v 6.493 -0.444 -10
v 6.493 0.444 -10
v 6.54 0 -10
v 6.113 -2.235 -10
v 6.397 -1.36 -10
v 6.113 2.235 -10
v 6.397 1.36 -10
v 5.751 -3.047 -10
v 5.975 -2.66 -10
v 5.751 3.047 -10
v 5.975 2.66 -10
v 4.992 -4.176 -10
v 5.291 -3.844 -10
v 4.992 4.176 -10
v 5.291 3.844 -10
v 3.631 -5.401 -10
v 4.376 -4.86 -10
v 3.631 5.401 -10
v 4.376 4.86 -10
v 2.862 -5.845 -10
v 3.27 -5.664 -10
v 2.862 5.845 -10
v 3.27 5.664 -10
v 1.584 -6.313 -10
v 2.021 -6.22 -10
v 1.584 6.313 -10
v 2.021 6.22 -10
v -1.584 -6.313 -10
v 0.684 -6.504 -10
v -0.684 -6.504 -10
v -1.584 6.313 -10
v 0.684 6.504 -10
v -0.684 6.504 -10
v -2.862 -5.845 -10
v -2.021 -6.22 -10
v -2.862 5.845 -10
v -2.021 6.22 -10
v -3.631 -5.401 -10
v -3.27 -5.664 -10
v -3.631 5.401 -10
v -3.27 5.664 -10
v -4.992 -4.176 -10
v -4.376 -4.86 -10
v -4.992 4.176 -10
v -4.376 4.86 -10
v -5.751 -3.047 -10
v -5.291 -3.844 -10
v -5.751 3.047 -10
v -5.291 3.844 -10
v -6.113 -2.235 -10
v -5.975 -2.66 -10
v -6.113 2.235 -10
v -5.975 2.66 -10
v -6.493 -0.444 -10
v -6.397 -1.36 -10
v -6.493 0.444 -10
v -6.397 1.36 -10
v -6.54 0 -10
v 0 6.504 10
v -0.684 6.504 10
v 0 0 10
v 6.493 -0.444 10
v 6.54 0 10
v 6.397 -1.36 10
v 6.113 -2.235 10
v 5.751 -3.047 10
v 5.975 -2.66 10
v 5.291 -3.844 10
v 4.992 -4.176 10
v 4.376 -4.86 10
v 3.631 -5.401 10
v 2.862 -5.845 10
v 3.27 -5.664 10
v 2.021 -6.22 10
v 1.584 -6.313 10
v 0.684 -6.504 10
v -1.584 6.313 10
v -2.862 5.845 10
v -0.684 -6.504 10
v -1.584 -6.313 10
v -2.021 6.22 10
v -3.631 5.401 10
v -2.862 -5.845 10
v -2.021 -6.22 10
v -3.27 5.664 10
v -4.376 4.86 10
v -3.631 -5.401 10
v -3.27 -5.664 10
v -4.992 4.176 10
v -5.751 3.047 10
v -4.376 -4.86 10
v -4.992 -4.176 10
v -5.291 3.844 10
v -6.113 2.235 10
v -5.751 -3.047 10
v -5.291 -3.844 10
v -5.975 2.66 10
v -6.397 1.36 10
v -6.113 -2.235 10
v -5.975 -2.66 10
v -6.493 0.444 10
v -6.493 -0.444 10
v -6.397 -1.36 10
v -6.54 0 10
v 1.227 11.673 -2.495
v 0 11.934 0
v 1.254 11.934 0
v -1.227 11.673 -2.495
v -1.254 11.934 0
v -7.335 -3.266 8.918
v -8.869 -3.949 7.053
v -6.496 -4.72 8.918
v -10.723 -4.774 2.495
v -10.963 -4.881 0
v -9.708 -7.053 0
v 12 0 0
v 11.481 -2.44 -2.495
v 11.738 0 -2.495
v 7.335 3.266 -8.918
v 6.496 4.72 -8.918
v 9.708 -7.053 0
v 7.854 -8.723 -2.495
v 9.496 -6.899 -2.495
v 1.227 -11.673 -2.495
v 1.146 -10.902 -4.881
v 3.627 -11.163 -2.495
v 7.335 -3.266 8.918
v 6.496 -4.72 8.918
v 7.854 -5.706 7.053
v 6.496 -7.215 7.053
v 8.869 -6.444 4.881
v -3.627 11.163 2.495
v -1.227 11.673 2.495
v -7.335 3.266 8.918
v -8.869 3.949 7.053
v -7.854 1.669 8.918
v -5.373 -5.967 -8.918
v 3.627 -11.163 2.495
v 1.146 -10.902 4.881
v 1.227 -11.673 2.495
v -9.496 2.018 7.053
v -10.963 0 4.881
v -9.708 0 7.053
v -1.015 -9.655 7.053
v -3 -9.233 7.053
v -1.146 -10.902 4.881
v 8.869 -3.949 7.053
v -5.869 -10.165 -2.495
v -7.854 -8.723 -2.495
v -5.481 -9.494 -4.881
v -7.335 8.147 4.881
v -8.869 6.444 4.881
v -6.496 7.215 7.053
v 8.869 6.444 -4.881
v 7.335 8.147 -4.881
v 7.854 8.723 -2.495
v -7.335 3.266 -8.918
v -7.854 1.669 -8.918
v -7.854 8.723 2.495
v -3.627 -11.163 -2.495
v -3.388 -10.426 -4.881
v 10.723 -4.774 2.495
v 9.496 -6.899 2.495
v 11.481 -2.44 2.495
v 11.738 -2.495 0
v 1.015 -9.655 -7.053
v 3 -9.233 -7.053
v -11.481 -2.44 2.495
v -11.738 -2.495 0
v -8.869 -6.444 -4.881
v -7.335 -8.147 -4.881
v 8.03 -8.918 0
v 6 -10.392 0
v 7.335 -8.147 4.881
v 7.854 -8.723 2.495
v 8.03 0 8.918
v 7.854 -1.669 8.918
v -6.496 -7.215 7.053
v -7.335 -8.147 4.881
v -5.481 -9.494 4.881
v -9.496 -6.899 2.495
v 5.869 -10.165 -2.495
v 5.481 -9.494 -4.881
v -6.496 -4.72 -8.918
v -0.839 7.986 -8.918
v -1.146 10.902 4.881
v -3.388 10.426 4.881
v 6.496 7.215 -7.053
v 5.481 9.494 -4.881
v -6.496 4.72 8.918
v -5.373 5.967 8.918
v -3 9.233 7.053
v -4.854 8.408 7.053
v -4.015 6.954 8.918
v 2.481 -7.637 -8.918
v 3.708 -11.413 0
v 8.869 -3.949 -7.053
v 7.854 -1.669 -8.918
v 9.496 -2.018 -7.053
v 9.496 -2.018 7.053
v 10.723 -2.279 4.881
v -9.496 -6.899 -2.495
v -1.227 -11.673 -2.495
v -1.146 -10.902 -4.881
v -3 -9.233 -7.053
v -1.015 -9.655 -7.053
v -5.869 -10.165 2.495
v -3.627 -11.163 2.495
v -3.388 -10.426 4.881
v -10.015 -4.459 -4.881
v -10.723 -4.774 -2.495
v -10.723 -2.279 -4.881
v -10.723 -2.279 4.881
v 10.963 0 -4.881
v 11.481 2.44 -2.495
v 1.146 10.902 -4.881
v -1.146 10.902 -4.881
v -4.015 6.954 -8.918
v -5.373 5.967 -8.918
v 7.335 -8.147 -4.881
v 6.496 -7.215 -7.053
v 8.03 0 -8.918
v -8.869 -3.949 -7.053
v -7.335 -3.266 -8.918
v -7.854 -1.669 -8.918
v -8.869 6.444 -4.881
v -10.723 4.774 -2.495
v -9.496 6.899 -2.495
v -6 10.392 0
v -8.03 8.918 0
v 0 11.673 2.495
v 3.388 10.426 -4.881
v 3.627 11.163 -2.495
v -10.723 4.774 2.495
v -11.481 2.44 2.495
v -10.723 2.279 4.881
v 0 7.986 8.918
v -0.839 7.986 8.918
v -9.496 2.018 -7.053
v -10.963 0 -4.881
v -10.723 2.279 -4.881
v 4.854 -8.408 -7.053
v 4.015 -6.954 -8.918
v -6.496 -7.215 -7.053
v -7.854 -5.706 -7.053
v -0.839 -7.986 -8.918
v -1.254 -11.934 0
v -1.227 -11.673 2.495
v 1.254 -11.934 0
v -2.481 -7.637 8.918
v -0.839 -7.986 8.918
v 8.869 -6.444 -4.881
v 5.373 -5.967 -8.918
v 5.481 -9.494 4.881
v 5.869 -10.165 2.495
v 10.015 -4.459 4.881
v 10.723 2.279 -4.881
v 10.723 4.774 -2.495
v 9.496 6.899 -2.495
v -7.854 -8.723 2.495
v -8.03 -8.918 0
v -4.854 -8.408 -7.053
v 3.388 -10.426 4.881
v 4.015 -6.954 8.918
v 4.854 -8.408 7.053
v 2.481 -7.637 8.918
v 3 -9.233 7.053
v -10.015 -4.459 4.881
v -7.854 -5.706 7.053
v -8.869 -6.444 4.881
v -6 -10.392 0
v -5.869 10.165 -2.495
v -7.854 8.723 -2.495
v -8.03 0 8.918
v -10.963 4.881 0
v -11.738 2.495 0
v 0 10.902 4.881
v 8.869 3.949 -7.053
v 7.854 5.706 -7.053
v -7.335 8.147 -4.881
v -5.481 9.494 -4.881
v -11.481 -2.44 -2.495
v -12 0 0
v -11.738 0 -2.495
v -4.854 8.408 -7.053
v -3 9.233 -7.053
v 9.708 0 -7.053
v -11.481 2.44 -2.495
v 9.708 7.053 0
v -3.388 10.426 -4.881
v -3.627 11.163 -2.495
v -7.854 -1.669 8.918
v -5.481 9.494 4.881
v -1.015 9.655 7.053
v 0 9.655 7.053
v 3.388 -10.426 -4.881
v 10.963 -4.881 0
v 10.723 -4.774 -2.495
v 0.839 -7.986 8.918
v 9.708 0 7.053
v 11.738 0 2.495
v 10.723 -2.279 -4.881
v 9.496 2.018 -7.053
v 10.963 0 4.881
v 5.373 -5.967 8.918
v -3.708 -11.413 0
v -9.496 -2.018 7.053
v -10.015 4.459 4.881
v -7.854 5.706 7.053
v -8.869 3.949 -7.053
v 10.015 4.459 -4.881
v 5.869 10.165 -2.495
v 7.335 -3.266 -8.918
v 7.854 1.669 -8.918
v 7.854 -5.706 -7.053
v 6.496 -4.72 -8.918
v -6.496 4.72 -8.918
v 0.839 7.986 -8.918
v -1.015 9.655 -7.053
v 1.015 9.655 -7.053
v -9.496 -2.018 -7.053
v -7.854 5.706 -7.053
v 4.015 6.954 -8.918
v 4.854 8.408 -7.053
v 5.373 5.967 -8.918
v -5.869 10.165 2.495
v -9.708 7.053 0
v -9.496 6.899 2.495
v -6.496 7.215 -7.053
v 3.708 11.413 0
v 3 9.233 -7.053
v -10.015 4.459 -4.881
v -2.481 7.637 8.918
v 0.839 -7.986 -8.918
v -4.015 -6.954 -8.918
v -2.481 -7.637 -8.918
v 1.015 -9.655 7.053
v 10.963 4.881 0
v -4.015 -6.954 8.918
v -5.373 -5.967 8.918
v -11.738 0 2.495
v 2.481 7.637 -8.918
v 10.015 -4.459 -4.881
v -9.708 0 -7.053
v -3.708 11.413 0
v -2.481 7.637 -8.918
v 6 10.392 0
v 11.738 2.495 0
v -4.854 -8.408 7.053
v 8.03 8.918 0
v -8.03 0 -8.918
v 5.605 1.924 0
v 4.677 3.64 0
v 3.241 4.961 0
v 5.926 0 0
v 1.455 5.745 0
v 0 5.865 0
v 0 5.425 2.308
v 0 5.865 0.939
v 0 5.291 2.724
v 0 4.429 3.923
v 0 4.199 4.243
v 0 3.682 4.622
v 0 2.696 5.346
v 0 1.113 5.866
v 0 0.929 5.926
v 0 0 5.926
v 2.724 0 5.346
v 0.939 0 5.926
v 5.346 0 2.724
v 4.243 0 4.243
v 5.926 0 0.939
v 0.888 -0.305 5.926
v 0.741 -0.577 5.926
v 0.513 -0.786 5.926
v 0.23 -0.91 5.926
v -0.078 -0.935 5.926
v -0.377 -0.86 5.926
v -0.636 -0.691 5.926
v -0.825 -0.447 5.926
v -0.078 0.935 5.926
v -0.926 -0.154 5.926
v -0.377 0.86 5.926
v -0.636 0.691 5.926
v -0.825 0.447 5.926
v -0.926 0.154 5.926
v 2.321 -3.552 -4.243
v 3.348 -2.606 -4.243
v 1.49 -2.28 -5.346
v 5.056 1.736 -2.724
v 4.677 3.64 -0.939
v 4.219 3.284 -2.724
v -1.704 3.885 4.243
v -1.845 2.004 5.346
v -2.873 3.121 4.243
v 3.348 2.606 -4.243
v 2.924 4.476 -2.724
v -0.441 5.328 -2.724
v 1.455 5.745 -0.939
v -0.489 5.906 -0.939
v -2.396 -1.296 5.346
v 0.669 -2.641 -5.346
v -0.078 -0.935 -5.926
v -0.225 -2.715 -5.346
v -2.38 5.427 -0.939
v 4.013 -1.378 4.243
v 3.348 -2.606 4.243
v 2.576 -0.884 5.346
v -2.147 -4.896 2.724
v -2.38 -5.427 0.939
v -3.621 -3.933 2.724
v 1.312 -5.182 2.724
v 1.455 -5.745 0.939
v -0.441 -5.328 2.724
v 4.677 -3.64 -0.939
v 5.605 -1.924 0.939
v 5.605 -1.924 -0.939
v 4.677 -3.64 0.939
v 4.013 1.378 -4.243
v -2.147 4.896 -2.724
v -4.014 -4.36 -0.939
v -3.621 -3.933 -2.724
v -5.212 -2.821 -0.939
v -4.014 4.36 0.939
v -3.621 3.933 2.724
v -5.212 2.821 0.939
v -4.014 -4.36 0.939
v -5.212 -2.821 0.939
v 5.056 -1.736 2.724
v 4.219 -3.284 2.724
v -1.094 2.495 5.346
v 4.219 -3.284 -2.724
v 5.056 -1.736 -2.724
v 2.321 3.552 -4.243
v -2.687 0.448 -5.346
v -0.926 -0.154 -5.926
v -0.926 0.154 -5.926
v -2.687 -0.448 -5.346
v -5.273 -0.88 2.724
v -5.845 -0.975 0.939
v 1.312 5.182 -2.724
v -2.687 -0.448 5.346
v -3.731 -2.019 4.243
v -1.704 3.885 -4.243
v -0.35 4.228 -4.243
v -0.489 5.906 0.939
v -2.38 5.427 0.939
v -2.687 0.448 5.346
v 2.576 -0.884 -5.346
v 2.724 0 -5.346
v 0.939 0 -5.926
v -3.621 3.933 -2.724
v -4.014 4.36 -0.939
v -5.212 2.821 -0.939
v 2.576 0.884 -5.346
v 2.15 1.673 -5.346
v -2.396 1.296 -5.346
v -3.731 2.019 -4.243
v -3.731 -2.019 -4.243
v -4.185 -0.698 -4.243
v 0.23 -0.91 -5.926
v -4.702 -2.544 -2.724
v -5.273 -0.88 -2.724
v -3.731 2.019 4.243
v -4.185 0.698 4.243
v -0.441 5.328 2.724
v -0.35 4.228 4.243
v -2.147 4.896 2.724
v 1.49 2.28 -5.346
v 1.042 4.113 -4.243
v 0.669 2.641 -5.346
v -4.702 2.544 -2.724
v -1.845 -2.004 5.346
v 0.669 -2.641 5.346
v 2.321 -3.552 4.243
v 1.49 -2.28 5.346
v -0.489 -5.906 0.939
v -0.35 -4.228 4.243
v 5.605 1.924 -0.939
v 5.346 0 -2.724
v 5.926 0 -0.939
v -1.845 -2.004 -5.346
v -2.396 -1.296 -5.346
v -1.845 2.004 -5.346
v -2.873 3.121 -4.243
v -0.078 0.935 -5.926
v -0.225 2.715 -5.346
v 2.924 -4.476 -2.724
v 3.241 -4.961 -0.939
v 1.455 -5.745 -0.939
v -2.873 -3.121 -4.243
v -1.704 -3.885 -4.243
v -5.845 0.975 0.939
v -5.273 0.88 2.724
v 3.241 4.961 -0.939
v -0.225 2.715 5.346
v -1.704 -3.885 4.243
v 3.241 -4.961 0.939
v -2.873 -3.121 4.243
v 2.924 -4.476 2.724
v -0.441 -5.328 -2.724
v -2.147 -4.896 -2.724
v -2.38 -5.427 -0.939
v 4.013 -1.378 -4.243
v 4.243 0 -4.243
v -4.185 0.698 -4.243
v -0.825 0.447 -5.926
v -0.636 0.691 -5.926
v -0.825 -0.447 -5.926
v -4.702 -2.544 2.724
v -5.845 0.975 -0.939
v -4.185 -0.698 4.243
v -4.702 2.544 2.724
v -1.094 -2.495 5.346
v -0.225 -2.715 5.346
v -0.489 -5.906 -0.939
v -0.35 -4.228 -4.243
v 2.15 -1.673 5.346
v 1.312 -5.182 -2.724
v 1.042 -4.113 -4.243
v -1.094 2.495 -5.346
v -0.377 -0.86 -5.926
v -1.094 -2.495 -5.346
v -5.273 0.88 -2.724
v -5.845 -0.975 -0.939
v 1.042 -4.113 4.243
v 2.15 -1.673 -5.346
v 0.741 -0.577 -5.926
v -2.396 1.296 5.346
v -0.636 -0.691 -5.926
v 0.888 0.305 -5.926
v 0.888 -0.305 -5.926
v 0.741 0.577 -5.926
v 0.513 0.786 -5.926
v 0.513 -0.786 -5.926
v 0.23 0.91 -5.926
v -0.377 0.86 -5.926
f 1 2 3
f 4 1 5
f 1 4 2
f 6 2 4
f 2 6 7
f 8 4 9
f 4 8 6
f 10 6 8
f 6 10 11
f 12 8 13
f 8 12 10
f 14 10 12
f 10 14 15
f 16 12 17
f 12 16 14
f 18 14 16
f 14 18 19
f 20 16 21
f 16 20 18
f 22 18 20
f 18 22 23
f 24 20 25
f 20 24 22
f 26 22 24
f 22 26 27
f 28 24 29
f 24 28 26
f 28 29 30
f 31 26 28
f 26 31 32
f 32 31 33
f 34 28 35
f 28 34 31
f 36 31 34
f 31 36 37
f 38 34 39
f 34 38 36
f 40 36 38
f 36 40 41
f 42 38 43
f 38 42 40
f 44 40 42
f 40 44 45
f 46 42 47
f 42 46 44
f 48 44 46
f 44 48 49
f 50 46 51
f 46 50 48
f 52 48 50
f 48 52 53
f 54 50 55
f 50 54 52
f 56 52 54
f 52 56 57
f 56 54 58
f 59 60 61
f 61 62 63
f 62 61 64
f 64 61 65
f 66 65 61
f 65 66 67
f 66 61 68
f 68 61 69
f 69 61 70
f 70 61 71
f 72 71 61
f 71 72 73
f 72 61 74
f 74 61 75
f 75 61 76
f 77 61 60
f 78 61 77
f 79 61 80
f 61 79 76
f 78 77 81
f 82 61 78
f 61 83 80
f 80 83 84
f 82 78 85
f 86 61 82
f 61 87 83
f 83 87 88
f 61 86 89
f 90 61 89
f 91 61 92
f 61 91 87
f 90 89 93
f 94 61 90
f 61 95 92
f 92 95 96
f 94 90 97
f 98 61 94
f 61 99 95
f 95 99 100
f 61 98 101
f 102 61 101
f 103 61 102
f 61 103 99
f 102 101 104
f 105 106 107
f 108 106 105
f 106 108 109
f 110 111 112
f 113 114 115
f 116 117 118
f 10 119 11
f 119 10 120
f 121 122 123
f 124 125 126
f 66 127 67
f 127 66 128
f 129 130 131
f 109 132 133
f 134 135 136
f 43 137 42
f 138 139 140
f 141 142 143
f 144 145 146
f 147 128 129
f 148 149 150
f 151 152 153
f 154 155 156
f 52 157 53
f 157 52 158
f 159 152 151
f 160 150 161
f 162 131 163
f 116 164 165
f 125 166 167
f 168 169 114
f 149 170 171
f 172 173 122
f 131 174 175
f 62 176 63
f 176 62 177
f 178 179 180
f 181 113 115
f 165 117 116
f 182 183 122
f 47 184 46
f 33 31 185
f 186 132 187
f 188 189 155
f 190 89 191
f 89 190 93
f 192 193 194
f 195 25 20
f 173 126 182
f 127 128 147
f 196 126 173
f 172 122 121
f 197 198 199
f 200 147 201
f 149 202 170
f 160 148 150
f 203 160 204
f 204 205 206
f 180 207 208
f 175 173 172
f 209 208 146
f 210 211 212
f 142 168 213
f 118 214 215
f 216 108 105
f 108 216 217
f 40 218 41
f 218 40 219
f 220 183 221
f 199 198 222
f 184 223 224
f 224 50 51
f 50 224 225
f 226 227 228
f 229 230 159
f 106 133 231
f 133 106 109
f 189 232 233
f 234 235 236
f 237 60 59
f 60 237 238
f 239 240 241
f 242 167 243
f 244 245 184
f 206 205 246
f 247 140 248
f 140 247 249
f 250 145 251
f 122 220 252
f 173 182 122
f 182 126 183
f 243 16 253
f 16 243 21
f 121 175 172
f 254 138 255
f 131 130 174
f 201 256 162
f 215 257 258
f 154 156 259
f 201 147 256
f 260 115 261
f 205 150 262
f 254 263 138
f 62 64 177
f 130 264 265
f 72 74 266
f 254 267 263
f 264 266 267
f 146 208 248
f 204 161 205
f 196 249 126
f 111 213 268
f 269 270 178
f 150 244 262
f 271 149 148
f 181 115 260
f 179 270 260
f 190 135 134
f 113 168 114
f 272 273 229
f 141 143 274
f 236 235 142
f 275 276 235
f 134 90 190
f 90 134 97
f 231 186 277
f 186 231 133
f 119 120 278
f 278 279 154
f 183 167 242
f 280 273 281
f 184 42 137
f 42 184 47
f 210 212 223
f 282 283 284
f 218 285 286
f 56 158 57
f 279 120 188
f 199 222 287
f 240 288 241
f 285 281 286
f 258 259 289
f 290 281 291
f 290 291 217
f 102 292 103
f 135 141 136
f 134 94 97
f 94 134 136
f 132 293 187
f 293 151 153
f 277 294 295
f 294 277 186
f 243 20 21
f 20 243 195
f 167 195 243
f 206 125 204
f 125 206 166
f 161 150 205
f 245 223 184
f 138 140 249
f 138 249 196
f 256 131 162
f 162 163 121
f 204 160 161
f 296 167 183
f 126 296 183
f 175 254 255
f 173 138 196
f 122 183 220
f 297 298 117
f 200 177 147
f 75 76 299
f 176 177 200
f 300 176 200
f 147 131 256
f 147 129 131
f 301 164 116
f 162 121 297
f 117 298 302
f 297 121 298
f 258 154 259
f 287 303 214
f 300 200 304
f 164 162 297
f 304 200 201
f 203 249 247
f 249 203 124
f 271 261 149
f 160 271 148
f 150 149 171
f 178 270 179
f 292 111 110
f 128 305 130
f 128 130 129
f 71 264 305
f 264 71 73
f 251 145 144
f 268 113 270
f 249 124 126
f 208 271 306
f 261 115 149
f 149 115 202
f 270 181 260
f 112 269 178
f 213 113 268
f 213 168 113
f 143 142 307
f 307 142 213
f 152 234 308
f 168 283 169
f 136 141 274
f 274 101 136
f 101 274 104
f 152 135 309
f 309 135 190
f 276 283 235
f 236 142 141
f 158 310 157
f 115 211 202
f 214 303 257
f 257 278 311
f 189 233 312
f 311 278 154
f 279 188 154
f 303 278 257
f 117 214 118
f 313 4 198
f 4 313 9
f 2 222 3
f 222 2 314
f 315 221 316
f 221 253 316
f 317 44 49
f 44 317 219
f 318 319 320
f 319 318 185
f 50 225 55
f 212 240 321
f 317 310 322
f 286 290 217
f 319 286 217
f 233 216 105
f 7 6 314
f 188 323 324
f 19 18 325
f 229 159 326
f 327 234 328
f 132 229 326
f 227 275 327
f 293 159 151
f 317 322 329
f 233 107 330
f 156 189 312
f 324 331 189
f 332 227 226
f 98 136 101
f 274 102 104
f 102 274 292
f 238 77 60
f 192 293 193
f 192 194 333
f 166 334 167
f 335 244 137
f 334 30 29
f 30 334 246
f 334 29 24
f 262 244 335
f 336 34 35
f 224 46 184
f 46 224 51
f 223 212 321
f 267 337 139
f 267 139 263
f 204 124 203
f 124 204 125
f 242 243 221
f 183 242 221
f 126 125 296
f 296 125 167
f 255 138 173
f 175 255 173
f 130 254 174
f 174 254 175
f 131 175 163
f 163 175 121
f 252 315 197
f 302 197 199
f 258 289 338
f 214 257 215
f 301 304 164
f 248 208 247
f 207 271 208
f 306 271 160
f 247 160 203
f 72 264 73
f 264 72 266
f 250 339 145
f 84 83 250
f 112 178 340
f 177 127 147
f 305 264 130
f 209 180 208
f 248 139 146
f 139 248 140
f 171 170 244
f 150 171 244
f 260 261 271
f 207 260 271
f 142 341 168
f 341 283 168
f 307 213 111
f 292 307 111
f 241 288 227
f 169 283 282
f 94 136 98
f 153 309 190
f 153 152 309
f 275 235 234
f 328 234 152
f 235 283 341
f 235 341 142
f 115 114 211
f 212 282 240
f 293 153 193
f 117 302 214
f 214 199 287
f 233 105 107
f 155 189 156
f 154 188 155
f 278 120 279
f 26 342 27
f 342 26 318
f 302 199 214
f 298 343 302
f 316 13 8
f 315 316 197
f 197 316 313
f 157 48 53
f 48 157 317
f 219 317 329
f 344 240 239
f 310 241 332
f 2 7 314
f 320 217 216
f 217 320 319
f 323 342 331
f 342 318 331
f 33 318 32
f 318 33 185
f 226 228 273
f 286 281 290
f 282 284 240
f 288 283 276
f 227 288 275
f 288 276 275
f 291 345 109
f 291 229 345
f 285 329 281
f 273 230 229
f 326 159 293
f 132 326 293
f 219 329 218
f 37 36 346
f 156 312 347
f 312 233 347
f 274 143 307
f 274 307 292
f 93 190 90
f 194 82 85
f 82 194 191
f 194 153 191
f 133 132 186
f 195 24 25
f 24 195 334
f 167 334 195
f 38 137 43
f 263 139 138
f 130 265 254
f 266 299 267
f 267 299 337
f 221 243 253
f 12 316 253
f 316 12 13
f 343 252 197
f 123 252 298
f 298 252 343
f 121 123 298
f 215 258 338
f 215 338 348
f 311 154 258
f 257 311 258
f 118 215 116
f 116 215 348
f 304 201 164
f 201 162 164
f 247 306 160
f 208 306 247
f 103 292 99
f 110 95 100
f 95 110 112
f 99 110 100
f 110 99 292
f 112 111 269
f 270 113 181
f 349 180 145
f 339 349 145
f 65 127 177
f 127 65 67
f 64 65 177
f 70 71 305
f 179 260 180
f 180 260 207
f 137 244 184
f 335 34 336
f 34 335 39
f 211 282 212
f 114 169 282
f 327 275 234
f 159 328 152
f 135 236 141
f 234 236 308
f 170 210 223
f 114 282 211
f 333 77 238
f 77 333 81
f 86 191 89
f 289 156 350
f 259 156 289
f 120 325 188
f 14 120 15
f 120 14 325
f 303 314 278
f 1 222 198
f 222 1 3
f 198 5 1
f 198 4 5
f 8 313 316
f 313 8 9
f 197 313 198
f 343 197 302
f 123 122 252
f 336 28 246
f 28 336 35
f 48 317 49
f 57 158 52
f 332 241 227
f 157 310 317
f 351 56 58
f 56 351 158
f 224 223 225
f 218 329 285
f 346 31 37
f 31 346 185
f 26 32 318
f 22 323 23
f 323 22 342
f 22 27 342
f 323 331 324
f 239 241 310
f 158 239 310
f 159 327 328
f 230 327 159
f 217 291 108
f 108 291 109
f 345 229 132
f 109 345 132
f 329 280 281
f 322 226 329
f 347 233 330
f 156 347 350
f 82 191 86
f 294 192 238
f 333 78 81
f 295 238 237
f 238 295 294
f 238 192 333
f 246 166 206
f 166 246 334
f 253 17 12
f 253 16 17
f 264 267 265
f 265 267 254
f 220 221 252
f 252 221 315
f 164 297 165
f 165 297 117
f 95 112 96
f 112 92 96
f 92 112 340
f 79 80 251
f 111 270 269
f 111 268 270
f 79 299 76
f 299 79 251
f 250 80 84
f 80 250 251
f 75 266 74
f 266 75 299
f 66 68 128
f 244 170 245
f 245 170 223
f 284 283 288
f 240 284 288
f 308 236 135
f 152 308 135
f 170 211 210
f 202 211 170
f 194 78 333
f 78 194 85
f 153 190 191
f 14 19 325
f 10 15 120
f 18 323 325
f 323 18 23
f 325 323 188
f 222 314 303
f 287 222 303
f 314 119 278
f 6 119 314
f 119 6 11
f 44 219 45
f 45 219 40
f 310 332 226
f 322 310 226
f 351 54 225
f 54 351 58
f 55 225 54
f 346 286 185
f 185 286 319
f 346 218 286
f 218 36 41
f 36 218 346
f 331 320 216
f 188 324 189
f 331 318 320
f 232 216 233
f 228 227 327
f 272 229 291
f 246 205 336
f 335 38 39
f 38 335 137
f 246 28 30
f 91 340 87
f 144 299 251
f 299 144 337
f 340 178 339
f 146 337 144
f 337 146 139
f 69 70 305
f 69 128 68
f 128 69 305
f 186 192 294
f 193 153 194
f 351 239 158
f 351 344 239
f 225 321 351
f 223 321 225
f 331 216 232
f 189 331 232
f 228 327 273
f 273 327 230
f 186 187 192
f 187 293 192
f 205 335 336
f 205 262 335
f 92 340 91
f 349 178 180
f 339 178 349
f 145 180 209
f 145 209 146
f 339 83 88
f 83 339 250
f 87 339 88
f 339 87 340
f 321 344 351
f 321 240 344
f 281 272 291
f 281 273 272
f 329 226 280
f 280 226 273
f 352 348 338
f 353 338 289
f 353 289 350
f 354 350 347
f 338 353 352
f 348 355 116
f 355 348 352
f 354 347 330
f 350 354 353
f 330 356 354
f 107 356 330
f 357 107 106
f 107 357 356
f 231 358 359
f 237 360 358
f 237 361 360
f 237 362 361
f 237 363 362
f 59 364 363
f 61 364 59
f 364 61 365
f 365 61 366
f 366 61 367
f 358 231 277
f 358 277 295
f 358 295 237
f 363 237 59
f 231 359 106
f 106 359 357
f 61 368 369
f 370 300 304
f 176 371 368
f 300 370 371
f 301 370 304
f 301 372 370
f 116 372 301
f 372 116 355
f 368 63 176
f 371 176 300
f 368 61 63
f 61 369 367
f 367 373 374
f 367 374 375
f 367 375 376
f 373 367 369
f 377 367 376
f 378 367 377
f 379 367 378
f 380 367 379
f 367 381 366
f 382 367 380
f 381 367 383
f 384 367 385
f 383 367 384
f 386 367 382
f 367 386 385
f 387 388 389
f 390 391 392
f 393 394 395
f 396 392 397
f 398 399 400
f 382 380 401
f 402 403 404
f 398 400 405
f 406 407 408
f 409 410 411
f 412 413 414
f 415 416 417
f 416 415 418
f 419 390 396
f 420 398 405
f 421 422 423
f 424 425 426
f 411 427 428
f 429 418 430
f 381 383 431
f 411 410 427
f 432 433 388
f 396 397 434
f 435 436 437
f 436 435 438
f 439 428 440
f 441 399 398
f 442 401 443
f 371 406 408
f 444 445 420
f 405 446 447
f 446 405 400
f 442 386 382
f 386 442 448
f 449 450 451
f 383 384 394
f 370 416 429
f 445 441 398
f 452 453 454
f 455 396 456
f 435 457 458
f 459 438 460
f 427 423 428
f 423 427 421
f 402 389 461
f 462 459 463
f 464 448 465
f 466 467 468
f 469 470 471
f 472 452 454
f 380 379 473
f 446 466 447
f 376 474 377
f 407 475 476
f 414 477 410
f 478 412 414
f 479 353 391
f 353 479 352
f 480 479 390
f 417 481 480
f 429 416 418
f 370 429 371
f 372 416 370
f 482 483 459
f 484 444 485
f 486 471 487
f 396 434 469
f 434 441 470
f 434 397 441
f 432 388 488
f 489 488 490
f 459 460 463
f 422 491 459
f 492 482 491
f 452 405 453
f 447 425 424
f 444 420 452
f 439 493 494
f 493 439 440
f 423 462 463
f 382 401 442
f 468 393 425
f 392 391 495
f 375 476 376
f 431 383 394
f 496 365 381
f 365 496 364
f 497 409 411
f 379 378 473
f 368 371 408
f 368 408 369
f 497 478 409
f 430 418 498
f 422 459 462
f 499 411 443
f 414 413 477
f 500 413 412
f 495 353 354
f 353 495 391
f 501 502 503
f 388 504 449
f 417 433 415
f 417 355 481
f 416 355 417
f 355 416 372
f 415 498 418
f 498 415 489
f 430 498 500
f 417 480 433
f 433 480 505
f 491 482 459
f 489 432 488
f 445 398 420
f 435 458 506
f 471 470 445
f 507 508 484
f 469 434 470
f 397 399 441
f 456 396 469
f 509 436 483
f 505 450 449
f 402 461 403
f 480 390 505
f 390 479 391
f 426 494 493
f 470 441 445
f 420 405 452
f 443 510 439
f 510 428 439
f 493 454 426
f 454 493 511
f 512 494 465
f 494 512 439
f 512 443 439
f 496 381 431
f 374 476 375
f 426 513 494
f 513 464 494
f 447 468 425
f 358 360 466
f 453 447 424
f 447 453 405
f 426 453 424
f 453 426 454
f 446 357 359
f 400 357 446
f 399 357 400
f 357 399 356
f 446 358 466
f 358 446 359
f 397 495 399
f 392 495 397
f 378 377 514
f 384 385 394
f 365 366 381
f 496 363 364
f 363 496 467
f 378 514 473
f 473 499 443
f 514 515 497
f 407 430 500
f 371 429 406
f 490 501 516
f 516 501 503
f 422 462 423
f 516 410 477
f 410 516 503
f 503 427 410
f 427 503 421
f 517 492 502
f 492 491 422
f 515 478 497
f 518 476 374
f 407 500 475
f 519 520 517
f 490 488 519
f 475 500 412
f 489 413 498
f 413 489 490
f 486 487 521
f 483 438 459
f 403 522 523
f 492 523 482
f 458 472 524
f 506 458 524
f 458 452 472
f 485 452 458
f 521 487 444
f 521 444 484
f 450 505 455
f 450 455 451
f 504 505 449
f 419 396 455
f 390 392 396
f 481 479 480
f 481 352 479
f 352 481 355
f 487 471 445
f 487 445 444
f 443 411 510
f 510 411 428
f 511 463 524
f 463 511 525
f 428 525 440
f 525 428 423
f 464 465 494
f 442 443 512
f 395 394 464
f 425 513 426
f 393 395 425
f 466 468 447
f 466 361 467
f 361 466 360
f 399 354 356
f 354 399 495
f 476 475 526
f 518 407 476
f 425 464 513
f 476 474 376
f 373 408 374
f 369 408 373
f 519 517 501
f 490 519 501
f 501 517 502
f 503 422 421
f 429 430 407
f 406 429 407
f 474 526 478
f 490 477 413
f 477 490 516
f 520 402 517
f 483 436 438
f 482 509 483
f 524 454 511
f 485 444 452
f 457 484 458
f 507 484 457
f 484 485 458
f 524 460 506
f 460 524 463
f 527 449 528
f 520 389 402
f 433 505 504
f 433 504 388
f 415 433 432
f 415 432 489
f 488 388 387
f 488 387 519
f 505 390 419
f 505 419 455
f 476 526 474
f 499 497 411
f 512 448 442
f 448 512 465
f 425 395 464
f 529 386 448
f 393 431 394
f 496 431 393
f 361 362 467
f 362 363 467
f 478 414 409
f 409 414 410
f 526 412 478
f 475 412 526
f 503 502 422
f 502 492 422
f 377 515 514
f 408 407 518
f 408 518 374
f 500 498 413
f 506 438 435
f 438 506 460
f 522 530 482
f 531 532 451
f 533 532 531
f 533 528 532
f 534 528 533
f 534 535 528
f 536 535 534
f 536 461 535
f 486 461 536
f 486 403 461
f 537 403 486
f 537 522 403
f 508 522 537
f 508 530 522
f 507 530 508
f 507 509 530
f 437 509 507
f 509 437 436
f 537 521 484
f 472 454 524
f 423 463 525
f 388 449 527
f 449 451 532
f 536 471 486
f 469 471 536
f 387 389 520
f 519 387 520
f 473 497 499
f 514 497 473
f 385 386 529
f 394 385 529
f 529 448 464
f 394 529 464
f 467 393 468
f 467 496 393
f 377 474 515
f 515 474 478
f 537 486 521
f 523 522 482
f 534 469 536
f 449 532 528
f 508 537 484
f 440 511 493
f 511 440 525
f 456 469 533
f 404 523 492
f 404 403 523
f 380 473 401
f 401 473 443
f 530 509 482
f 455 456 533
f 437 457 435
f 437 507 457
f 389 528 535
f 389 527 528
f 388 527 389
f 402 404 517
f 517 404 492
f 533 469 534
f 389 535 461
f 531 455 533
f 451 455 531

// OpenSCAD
// Generated by generate_scads.py
difference() {
  intersection() {
    cylinder(h=20, r=12, center=true);
    sphere(r=12);
  }
  sphere(r=4);
  cube(size=[15,15,10], center=false);
  intersection() {
    sphere(r=6);
  }
}
